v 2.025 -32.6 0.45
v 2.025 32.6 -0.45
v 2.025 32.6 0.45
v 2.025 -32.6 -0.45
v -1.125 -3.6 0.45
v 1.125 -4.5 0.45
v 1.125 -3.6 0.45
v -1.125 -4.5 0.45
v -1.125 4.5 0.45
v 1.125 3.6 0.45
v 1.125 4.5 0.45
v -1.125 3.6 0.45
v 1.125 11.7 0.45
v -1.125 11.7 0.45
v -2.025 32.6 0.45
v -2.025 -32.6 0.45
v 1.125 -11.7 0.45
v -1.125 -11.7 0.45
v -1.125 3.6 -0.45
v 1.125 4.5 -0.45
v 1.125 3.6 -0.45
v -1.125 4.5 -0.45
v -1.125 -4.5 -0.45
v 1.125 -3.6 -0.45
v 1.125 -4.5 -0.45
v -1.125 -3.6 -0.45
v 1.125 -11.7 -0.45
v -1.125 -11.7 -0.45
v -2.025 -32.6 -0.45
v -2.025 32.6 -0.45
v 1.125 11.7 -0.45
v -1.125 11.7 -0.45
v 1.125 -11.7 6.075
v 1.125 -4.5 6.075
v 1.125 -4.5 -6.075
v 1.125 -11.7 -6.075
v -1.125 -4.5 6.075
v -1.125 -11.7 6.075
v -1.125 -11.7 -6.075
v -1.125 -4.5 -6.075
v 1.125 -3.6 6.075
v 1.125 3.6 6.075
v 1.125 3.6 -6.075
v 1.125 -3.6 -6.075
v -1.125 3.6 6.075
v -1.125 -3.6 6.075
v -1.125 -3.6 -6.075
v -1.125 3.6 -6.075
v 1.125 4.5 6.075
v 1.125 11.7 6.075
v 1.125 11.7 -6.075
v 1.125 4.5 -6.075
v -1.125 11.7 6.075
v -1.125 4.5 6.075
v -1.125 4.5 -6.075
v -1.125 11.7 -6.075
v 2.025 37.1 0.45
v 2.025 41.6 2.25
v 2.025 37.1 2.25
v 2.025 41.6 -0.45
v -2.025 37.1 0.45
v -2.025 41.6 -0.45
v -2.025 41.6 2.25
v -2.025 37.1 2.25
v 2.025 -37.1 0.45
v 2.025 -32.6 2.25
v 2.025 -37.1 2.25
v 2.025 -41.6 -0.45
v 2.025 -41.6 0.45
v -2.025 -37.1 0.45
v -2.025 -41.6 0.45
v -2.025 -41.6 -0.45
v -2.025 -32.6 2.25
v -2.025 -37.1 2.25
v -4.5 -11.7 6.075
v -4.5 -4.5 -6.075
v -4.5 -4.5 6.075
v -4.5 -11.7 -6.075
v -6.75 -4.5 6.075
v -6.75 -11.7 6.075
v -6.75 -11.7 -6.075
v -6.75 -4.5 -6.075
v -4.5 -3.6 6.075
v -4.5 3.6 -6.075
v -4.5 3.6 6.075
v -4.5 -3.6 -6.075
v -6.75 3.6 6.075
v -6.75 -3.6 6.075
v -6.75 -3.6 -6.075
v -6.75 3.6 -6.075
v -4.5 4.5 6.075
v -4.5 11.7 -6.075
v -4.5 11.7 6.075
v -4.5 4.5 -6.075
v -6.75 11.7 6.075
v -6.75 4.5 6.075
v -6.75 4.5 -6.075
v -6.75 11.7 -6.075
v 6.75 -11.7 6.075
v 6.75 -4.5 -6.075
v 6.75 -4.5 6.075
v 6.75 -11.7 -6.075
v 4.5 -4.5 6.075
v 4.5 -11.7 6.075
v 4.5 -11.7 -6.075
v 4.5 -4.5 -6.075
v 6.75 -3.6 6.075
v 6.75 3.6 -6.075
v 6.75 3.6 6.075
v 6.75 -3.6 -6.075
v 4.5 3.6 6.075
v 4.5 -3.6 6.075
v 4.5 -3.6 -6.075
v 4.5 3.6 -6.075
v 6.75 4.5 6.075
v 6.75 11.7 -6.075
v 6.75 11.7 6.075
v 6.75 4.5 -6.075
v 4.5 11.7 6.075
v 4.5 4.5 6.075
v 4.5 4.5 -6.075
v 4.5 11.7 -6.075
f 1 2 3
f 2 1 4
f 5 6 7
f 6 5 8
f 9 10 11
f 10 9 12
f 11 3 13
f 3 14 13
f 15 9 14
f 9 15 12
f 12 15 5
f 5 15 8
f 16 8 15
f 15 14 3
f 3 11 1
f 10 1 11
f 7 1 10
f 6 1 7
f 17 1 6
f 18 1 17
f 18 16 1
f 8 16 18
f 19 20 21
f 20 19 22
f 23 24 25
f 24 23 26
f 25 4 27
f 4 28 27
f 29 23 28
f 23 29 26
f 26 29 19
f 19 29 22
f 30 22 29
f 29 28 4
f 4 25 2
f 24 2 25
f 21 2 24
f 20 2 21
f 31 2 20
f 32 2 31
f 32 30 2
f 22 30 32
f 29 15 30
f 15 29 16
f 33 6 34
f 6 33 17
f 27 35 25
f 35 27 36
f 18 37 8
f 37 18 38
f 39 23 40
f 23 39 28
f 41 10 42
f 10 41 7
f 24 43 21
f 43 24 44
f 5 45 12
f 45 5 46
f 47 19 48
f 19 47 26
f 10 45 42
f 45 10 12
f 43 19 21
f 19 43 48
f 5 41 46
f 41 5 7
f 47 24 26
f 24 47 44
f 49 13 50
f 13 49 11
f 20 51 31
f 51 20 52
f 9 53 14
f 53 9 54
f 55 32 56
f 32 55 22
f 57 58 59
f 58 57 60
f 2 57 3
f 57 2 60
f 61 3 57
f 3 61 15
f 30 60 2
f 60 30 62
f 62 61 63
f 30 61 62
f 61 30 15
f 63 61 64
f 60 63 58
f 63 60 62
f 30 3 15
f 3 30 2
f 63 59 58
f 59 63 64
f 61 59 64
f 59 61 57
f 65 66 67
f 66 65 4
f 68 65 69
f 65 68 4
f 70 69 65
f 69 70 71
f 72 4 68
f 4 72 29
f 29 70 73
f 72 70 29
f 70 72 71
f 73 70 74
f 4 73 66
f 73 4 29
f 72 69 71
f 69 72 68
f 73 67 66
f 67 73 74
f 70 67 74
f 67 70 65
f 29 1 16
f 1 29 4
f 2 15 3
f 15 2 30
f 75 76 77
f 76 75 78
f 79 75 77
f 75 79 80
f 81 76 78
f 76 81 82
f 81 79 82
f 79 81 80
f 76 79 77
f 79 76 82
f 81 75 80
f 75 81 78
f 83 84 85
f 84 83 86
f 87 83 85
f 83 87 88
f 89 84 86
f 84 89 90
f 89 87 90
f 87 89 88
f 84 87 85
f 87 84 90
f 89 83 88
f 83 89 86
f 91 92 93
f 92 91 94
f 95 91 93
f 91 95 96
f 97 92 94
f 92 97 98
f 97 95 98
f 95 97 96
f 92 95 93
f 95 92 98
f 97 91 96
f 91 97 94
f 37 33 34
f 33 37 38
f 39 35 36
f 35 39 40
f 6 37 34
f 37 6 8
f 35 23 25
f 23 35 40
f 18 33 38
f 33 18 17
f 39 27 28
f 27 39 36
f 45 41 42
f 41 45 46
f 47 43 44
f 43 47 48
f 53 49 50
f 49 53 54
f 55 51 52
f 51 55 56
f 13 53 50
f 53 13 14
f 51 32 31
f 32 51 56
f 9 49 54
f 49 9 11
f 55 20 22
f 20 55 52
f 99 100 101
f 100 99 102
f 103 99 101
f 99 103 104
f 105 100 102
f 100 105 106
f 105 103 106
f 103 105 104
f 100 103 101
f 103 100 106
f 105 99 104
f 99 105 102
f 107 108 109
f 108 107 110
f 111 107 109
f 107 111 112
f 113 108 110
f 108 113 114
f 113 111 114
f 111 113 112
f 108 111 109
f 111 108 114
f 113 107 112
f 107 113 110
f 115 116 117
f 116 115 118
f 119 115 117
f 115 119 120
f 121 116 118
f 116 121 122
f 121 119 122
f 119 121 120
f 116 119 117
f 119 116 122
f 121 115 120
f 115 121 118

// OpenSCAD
// file: holes.scad
include <globals.scad>;

use <pin.scad>;

module yHoles(n_y=3)
{
    for(s_y = [0 : n_y-1])
    {
        //# -1 as we want overlap to make as thin as possible
        translate([0, -(n_y-1)*(slidesSection_y-unit)/2,0])
        translate([0, s_y*(slidesSection_y-unit),0])
        pinHole();
    }
}

module gridHoles(n_x=3,n_y=3)
{
    for(s_x = [0 : n_x-1])
    {
        translate([-(n_x-1)*(x_hole_spacing)/2,0,0])
        translate([s_x*(x_hole_spacing),0,0])
        yHoles(n_y=3);

        translate([-(n_x-1)*(x_hole_spacing)/2,0,0])
        translate([s_x*(x_hole_spacing),0,0]);

    }    
}

//yHoles(n_y=3);
gridHoles(n_x=3,n_y=3);
// file: pin.scad
include <globals.scad>;

module pin()
{
    //# Space of 2 middle, 1
    //# 1 of each sde
    //# Total width = 4
    // # total height is bottom tabs (2) plus projection of 10 = 12
    difference()
    {
        union()
        {
            cube([pin_x, pin_y-(unit*2), pin_z], center=true);
            translate([0,0,-pin_z/2+unit/2]) // to bottom
            translate([0,0,1]) // up by 1
            cube([unit, pin_y, unit], center=true);
        }
        translate([0,0,unit ]) cube([unit*2, space+unit+space, pin_z], center=true);
    }
}


module pinHole()
{

    cube([hole_x, hole_y, hole_z], center=true);
}


pin();
//#pinHole();
// file: globals.scad
//based around 0.4 nozzle width
// block = 
unit = 0.45*2;
space = (unit/2)*1.5;

pin_x = unit * 1;
        // tab + spoke + space + rack + space + spoke + tab
pin_y = unit + unit + space + unit + space + unit + unit; 
pin_z = unit * 12;

hole_x = pin_x + (space*2); // 1 + 0.8 each side
hole_y = pin_y + (space*2); // 6 + 0.8 each side
hole_z = pin_z + (space*2); // 12 + 0.75 

slidesSection_x = unit+hole_x+unit;
slidesSection_y = unit+hole_y+unit;
slidesSection_z = unit;

boarder = 20;

x_hole_spacing = slidesSection_x + space + unit ;
// main file
include <globals.scad>;

use <pin.scad>;
use <holes.scad>;


module slide(n_y=3)
{
    union()
        {
            for(s_y = [0 : n_y-1])
            {
                //# -1 as we want overlap to make as thin as possible
                translate([0, -(n_y-1)*(slidesSection_y-unit)/2,0])
                translate([0, s_y*(slidesSection_y-unit),0])
                slideSecton();
            }
            //# Extend towards the boarder
            translate([0, -(n_y)*(slidesSection_y-unit)/2+-unit/2,0])
            translate([0, -boarder/2,0])
            cube([slidesSection_x, boarder, slidesSection_z], center=true);
            translate([0, (n_y)*(slidesSection_y-unit)/2+unit/2,0])
            translate([0, boarder/2,0])
            cube([slidesSection_x, boarder, slidesSection_z], center=true);
            //# Blockers each end
            translate([0, (n_y)*(slidesSection_y-unit)/2+unit/2,0])
            translate([0, boarder,0])
            translate([0, slidesSection_y/2,0])
            blocker();            
            translate([0, -((n_y)*(slidesSection_y-unit)/2+unit/2),0])
            translate([0, -boarder,0])
            translate([0, -slidesSection_y/2,0])
            blocker();            
        }
}

module blocker()
{
    cube([slidesSection_x, slidesSection_y, slidesSection_z], center=true);
    translate([0, slidesSection_y/4, slidesSection_z]) 
    cube([slidesSection_x, slidesSection_y/2, slidesSection_z*3], center=true);
}


    
module slideSecton()
{
    difference()
    {
        cube([slidesSection_x, slidesSection_y, slidesSection_z], center=true);
        pinHole();
    }
}



//slideSecton();
slide(n_y=3);
//yHoles(n_y=3);

#gridHoles(n_x=3,n_y=3);

echo(slidesSection_y, slidesSection_x, unit, slidesSection_y-unit, pin_z, hole_x, space);
